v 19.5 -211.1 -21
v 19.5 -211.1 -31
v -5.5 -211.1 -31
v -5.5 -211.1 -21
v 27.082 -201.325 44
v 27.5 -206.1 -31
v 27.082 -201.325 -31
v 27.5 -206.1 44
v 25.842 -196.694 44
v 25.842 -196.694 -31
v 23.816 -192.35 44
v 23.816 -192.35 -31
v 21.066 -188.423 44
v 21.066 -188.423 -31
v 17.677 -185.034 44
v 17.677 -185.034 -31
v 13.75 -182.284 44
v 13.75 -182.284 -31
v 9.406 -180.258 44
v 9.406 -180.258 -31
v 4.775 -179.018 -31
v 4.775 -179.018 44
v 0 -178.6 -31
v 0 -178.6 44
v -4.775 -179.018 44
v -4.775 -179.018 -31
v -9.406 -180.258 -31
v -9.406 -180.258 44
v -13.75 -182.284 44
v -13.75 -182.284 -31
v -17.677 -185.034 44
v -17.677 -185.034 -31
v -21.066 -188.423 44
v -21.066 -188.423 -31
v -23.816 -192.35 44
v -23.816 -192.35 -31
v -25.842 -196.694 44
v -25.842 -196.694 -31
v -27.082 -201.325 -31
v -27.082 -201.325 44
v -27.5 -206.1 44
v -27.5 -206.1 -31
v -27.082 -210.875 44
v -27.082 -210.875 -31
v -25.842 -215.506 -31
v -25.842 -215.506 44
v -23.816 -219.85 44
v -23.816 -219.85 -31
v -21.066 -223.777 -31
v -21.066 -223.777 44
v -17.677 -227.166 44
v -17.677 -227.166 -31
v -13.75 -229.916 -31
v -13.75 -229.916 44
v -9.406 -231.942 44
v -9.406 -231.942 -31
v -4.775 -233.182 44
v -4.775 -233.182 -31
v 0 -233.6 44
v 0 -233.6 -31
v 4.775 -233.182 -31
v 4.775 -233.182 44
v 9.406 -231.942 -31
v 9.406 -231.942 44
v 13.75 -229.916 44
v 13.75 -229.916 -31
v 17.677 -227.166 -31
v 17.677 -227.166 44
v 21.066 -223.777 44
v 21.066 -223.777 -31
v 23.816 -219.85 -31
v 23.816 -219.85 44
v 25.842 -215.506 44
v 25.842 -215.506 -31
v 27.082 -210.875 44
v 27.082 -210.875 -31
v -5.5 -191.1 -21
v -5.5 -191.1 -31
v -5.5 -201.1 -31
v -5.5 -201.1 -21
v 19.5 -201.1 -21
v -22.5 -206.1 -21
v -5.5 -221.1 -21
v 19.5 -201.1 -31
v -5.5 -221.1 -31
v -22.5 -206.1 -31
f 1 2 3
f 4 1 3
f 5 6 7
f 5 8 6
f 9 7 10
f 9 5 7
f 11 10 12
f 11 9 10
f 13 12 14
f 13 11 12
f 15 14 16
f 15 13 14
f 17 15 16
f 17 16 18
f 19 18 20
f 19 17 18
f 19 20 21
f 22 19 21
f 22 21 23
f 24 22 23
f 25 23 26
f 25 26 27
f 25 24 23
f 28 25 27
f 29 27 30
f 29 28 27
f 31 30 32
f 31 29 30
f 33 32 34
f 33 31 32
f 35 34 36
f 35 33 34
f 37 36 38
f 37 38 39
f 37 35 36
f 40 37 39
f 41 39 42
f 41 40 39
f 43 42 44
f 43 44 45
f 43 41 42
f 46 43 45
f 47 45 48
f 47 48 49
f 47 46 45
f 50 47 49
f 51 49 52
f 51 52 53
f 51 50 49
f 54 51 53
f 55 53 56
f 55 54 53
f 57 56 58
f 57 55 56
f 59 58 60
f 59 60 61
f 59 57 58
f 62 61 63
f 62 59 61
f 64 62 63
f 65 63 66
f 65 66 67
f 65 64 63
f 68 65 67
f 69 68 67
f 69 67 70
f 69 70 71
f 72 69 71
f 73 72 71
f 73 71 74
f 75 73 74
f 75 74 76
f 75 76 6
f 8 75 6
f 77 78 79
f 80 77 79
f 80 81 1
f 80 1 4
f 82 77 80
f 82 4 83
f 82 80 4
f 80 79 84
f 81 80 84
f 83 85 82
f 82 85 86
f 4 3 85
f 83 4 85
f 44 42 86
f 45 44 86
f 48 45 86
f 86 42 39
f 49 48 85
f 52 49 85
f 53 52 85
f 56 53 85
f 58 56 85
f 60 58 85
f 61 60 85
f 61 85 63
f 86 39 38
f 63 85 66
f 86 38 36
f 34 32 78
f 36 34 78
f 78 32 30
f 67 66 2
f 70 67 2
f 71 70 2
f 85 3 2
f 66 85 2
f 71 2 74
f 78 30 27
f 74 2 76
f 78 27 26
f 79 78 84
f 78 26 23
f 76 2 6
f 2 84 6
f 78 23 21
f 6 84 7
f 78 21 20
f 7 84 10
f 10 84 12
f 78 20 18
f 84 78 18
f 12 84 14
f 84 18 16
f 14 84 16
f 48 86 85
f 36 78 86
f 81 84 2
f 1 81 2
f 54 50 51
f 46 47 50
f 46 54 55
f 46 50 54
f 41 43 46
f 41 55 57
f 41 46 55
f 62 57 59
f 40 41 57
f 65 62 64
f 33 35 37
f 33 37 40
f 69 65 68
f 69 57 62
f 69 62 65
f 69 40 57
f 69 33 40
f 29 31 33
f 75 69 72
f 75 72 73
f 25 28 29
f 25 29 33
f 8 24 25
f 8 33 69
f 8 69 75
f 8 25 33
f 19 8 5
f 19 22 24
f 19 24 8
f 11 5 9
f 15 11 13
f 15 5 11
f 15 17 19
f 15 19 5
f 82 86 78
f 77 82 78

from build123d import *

# Parameters (mm, degrees)
SKETCH1_R                = 27.5
BOSS_EXTRUDE1_DEPTH      = 44
BOSS_EXTRUDE1_DEPTH_BACK = 31
CUT_EXTRUDE1_DEPTH       = 10


with BuildPart() as part:
    # Sketch1 → Boss-Extrude1 (new body, two sides)
    with BuildSketch(Plane.XY) as boss_extrude1_sk:
        with Locations((0, -206.1)):
            Circle(SKETCH1_R)
    extrude(amount=BOSS_EXTRUDE1_DEPTH)
    extrude(boss_extrude1_sk.sketch, amount=-BOSS_EXTRUDE1_DEPTH_BACK)

    # Sketch2 → Cut-Extrude1 (cut)
    with BuildSketch(Plane(origin=(0, 0, -31), x_dir=(-1, 0, 0), z_dir=(0, 0, -1))):
        Polygon((22.5, -206.1), (5.5, -191.1), (5.5, -201.1), (-19.5, -201.1), (-19.5, -211.1), (5.5, -211.1), (5.5, -221.1), align=None)
    extrude(amount=-CUT_EXTRUDE1_DEPTH, mode=Mode.SUBTRACT)


solid = part.part
